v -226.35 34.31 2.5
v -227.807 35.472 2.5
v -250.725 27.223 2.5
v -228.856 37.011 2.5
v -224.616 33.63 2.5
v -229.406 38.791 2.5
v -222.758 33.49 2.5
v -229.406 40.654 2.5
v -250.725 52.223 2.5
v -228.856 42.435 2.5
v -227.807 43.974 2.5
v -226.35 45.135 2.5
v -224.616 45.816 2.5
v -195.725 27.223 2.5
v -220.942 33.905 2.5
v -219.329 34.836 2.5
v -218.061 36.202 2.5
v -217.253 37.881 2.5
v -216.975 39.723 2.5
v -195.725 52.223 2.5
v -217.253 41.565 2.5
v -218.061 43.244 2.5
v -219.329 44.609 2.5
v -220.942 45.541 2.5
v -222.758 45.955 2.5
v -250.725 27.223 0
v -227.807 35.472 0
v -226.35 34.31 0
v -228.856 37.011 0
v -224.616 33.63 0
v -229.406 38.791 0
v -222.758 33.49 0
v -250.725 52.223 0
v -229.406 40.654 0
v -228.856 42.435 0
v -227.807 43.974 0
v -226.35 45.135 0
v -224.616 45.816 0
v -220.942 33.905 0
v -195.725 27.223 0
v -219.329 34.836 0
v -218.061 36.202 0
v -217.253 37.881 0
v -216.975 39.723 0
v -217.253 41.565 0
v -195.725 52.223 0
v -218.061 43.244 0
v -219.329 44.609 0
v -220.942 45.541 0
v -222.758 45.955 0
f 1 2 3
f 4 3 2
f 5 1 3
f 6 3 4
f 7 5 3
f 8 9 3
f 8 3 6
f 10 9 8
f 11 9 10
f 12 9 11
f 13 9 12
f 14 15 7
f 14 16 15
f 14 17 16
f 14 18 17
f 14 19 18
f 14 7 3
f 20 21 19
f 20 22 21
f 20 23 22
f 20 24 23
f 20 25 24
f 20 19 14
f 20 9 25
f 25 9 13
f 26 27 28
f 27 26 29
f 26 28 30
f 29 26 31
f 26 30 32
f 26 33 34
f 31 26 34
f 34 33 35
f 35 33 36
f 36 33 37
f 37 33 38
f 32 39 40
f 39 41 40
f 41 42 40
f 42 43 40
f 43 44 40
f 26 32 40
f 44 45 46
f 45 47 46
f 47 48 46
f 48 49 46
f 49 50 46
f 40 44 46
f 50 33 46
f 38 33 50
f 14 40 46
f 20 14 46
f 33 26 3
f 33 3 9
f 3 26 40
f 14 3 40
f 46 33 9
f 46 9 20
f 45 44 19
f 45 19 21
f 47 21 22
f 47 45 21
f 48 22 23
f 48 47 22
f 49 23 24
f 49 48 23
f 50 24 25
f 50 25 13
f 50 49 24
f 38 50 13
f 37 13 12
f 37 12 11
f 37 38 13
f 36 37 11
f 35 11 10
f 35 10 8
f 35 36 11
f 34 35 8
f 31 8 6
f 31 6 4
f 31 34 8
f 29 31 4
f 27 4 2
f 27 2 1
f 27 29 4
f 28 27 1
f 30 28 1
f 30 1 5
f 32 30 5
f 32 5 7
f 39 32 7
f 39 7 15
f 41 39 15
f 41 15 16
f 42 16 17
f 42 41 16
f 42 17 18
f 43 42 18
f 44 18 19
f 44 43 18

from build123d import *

# Parameters (mm, degrees)
SKETCH1_W           = 11
SKETCH1_H           = 5
SKETCH1_R           = 1.25
BOSS_EXTRUDE1_DEPTH = 0.5
SCALE2_SCALE        = 5


with BuildPart() as part:
    # Sketch1 → Boss-Extrude1 (new body)
    with BuildSketch(Plane.XY):
        with Locations((-44.645074627, 7.944567164)):
            Rectangle(SKETCH1_W, SKETCH1_H)
        with Locations((-44.645074627, 7.944567164)):
            Circle(SKETCH1_R, mode=Mode.SUBTRACT)
    extrude(amount=BOSS_EXTRUDE1_DEPTH)


with BuildPart() as part_1:
    # Scale2: scaled about (0, 0, 0)
    add(part.part.scale(SCALE2_SCALE))


solid = part_1.part
